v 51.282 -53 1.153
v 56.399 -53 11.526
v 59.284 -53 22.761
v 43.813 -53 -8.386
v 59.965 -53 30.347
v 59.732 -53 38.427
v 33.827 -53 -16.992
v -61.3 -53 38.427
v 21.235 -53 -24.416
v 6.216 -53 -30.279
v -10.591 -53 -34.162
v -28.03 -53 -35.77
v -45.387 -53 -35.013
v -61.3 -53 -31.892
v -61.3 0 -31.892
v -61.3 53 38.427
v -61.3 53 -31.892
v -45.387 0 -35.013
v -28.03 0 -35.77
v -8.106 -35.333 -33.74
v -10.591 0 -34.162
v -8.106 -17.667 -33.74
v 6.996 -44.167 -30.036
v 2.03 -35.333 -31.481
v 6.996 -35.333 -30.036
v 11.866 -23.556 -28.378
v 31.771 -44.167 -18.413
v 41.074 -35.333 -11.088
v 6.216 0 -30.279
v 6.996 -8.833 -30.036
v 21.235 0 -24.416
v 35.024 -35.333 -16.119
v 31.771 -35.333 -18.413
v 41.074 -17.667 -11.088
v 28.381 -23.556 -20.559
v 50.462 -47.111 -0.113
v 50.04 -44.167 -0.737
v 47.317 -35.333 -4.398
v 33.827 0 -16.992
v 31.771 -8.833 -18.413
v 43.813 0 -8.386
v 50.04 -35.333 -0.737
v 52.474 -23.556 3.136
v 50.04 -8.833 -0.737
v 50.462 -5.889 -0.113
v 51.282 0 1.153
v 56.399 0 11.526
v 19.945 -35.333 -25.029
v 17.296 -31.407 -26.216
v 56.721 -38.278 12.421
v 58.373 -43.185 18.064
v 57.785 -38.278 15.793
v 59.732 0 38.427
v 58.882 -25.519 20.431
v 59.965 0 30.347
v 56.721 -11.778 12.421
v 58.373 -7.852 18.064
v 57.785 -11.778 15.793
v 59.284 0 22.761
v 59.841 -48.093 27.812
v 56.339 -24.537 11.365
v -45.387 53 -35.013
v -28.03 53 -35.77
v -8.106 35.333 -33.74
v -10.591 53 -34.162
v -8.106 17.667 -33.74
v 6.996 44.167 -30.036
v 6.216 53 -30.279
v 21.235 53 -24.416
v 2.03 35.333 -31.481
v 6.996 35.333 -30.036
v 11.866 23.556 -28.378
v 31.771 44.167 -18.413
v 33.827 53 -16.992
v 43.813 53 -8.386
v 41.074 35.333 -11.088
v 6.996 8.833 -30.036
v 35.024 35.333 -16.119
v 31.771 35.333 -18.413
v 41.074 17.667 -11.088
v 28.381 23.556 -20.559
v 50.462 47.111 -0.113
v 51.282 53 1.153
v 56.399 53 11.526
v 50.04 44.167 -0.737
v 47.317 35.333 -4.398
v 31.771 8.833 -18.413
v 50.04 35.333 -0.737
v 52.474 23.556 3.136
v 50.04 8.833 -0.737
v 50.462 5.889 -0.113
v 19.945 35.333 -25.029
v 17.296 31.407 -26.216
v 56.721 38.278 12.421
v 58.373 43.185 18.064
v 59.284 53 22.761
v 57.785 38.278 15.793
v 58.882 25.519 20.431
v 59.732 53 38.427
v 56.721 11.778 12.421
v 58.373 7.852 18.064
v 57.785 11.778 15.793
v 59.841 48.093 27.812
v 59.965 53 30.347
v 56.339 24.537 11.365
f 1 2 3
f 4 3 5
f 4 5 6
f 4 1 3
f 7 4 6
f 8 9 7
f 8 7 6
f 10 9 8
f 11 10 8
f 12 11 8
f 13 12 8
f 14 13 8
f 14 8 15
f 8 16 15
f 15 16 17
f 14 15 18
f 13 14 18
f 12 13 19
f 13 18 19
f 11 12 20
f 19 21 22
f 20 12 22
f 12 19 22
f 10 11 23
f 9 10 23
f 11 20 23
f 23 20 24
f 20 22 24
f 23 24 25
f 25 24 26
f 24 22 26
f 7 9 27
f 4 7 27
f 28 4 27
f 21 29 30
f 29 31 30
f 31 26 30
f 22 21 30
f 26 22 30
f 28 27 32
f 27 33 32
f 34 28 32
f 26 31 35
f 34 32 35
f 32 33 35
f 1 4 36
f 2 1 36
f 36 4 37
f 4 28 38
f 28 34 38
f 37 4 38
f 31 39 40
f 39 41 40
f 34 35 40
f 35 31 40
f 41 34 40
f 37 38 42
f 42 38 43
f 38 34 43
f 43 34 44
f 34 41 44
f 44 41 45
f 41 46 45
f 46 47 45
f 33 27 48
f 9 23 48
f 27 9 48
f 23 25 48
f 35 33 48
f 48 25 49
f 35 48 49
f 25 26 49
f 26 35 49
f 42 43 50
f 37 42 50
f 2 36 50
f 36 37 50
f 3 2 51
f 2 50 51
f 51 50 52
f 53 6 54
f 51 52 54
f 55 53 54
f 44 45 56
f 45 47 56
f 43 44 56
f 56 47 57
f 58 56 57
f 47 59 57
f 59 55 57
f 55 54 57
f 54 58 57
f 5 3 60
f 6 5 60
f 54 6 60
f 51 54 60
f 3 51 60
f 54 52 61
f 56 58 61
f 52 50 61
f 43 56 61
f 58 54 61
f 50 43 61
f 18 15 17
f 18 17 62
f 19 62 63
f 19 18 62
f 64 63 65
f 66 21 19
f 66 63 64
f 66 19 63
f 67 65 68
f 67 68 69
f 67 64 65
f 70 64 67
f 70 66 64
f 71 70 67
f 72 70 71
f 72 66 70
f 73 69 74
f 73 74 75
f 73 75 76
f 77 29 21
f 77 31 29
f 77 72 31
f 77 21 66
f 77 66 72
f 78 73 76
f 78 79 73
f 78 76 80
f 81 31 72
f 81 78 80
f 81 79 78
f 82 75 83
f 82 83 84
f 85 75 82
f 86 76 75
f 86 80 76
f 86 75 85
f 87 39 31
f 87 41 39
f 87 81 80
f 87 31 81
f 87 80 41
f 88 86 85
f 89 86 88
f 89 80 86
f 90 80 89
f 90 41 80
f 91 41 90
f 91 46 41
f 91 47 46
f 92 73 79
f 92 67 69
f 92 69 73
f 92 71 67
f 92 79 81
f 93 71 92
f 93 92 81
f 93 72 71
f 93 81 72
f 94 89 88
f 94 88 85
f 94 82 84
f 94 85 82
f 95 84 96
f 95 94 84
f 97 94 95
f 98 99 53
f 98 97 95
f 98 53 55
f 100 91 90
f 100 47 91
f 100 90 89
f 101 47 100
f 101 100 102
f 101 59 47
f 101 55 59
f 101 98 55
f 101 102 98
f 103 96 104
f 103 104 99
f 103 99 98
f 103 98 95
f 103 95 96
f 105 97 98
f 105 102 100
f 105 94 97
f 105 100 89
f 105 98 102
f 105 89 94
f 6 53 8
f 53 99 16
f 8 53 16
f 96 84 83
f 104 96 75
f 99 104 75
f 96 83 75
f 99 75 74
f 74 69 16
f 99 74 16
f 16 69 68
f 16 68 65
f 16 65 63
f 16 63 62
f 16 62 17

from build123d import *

# Parameters (mm, degrees)
EXTRUDE_1_DEPTH = 53


with BuildPart() as part:
    # 草图1 → 凸台-拉伸1 (new, symmetric)
    with BuildSketch(Plane(origin=(0, 0, 0), x_dir=(1, 0, 0), z_dir=(0, 1, 0))):
        with BuildLine():
            Line((59.731801374, -38.427023203), (-61.3002513, -38.427023203))
            Line((-61.3002513, -38.427023203), (-61.3002513, 31.891815175))
            add(Edge.make_bspline(
                [(-61.3002513, 31.891815175), (-14.935887617, 45.201796535), (65.170920947, 25.308509373), (59.731801374, -38.427023203)],
                knots=[0, 0, 0, 0, 1, 1, 1, 1], degree=3))
        make_face()
    extrude(amount=EXTRUDE_1_DEPTH, both=True)


solid = part.part
